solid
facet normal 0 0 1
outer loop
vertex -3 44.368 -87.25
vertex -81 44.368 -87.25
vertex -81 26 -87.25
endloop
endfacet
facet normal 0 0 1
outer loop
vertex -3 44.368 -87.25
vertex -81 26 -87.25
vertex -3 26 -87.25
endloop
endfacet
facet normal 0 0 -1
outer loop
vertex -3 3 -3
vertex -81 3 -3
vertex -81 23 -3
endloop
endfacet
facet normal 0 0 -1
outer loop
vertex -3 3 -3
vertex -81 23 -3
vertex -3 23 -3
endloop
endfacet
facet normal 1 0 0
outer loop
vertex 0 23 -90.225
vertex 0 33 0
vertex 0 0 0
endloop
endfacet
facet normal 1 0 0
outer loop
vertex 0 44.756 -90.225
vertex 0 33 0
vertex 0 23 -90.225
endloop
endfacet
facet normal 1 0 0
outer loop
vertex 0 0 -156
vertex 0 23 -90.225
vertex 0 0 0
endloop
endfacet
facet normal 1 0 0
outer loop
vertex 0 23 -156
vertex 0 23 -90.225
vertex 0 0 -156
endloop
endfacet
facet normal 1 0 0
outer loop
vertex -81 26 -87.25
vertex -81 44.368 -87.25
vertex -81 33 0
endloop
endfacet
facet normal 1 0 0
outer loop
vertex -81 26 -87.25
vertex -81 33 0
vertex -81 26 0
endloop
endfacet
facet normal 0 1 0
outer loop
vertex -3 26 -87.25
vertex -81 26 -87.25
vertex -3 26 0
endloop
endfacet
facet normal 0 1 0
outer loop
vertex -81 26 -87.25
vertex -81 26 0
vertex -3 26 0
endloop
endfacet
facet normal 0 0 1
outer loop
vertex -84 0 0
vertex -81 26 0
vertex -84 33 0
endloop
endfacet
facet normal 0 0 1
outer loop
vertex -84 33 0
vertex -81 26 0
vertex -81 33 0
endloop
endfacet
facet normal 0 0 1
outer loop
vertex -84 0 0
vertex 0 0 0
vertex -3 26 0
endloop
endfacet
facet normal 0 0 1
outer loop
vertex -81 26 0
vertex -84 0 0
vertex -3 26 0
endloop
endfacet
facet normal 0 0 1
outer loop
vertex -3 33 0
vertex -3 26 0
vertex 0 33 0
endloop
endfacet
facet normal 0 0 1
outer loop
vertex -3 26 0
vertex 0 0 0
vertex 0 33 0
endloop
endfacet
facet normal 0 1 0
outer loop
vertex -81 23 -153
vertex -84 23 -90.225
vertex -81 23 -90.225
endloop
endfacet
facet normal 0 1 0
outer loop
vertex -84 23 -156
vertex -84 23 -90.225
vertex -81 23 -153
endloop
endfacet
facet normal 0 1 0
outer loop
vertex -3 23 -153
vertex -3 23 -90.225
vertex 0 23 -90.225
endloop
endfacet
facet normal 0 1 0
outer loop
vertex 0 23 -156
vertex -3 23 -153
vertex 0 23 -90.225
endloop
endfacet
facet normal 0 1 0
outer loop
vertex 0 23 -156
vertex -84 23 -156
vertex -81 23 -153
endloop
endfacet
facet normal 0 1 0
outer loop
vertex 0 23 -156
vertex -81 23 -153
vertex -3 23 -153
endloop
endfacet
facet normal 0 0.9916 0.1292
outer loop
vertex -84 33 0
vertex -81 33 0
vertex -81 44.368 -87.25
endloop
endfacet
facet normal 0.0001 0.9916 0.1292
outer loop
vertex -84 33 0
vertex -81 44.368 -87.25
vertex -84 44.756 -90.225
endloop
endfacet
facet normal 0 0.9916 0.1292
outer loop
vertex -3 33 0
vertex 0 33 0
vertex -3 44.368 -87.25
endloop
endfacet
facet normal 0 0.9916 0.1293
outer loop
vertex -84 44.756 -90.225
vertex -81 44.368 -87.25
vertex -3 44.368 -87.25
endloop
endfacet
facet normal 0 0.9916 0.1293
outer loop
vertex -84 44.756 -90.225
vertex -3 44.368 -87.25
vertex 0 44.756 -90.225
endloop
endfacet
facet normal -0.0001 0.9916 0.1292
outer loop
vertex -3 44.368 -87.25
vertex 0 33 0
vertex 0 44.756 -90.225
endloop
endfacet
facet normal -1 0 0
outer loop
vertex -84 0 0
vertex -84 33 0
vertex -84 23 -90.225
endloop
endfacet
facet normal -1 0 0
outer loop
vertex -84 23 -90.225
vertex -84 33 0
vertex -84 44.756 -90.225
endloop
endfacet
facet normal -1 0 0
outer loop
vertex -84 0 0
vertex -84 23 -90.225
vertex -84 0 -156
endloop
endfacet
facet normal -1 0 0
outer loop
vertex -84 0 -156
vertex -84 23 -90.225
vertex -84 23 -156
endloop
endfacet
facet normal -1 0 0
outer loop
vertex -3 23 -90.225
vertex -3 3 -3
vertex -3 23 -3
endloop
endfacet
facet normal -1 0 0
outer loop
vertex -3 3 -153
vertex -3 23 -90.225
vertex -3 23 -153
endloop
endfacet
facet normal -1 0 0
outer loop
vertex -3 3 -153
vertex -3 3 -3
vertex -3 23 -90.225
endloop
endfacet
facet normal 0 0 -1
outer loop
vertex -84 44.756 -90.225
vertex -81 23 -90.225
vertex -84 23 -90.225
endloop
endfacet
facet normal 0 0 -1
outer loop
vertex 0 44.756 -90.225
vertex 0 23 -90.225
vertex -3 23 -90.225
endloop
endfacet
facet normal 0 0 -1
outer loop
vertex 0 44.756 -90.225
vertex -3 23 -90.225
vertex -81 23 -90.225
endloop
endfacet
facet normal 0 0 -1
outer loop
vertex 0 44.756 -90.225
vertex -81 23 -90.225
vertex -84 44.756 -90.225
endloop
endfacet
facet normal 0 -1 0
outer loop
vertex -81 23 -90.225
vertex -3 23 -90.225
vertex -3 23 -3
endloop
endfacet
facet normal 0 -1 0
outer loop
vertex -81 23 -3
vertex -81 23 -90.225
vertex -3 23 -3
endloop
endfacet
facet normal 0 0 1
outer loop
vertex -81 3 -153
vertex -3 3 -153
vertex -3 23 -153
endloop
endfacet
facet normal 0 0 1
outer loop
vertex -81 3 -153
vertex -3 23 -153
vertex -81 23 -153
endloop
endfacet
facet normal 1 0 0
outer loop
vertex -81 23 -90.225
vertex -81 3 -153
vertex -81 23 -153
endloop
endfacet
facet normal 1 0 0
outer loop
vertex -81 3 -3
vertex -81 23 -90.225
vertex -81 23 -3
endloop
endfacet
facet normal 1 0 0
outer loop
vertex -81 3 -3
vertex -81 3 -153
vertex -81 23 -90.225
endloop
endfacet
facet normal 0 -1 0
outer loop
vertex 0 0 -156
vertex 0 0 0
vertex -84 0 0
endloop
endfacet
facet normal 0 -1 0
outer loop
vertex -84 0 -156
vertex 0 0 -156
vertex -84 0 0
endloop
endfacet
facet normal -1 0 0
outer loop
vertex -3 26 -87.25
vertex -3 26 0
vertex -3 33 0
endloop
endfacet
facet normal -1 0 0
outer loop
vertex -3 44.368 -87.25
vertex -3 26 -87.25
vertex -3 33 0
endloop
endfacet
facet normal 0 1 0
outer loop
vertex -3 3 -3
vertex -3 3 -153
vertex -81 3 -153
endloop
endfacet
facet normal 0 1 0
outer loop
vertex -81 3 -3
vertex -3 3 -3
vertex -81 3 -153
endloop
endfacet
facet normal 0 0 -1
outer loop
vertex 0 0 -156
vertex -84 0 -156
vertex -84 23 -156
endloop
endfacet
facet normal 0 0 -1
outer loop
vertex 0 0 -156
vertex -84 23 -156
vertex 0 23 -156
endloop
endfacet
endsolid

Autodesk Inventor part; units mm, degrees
ref_plane "YZ Plane" through (0, 0, 0) normal (1, 0, 0) x (0, 1, 0)
ref_plane "XZ Plane" through (0, 0, 0) normal (0, 1, 0) x (-1, 0, 0)
ref_plane "XY Plane" through (0, 0, 0) normal (0, 0, 1) x (1, 0, 0)
sketch "Sketch1" plane through (0, 0, 0) normal (0, 1, 0) x (-1, 0, 0)
  line L0 (0, 0) -> (84, 0)
  line L1 (84, 0) -> (84, -156)
  line L2 (84, -156) -> (0, -156)
  line L3 (0, -156) -> (0, 0)
  line L4 (84, 0) -> (81, 0)
  line L5 (81, 0) -> (81, -3) construction
  line L6 (81, -3) -> (84, -3) construction
  line L7 (84, -3) -> (84, 0)
  line L8 (0, -156) -> (3, -156)
  line L9 (3, -156) -> (3, -153) construction
  line L10 (3, -153) -> (0, -153) construction
  line L11 (0, -153) -> (0, -156)
  line L12 (81, -3) -> (0, -3) construction
  dimension "d0" = 84
  dimension "d1" = 156
extrude "Extrusion1" add sketch "Sketch1" along normal blind 3
sketch "Sketch2" plane through (0, 3, 0) normal (0, 1, 0) x (1, 0, 0)
  line L0 (-84, 0) -> (0, 0) projected
  line L1 (-84, 0) -> (-42, 0)
  line L2 (-81, 3) -> (-3, 3)
  line L3 (-3, 3) -> (-3, 153)
  line L4 (-3, 153) -> (-81, 153)
  line L5 (-81, 153) -> (-81, 3)
  line L6 (-42, 0) -> (-42, 3)
  line L7 (-81, 3) -> (-47.5, 3)
  line L8 (0, 0) -> (0, 156) projected
  line L9 (-84, 0) -> (0, 0)
  line L10 (0, 0) -> (0, 156)
  line L11 (0, 156) -> (-84, 156)
  line L12 (-84, 156) -> (-84, 0)
  line L13 (-84, 156) -> (-84, 0) projected
  dimension "d12" = 42
  dimension "d13" = 78
  dimension "d14" = 150
  dimension "d15" = 3
  dimension "d16" = 33.5
extrude "Extrusion2" add sketch "Sketch2" along normal blind 20
sketch "Sketch3" plane through (0, 0, 0) normal (1, 0, 0) x (0, 0, -1)
  line L0 (156, 23) -> (0, 23) projected
  line L1 (0, 23) -> (90.225, 23)
  line L2 (90.225, 23) -> (90.225, 26)
  line L3 (90.225, 26) -> (0, 26)
  line L4 (0, 26) -> (0, 23)
  point P0 (0, 0)
  dimension "d19" = 90.225
  dimension "d20" = 3
extrude "Extrusion3" add sketch "Sketch3" against normal up to surface (84 mm away)
sketch "Sketch4" plane through (0, 0, 0) normal (1, 0, 0) x (0, 0, -1)
  line L0 (0, 33) -> (90.225, 44.756)
  line L1 (0, 26) -> (0, 33)
  line L2 (90.225, 23) -> (90.225, 26) projected
  line L3 (0, 26) -> (90.225, 26)
  line L4 (90.225, 26) -> (90.225, 44.756)
sketch "Sketch5" plane through (-84, 0, 0) normal (0, 0, 1) x (1, 0, 0)
  line L0 (3, 33) -> (3, 26)
  line L1 (3, 26) -> (81, 26)
  line L2 (81, 26) -> (81, 33)
  line L3 (81, 26) -> (3, 26)
  line L4 (3, 26) -> (3, 44.756)
  line L5 (3, 44.756) -> (81, 44.756)
  line L6 (81, 44.756) -> (81, 26)
  line L7 (3, 33) -> (81, 33)
  point P0 (84, 0)
  point P1 (84, 33)
  dimension "d27" = 3
  dimension "d28" = 78
  dimension "d29" = 7
sketch "Sketch6" plane through (0, 0, 0) normal (1, 0, 0) x (0, 0, -1)
  point P0 (0, 0)
extrude "Extrusion7" add sketch "Sketch4" against normal up to surface (84 mm away)
extrude "Extrusion10" cut sketch "Sketch5" against normal blind 87.25
properties part number "PB en arduino"
